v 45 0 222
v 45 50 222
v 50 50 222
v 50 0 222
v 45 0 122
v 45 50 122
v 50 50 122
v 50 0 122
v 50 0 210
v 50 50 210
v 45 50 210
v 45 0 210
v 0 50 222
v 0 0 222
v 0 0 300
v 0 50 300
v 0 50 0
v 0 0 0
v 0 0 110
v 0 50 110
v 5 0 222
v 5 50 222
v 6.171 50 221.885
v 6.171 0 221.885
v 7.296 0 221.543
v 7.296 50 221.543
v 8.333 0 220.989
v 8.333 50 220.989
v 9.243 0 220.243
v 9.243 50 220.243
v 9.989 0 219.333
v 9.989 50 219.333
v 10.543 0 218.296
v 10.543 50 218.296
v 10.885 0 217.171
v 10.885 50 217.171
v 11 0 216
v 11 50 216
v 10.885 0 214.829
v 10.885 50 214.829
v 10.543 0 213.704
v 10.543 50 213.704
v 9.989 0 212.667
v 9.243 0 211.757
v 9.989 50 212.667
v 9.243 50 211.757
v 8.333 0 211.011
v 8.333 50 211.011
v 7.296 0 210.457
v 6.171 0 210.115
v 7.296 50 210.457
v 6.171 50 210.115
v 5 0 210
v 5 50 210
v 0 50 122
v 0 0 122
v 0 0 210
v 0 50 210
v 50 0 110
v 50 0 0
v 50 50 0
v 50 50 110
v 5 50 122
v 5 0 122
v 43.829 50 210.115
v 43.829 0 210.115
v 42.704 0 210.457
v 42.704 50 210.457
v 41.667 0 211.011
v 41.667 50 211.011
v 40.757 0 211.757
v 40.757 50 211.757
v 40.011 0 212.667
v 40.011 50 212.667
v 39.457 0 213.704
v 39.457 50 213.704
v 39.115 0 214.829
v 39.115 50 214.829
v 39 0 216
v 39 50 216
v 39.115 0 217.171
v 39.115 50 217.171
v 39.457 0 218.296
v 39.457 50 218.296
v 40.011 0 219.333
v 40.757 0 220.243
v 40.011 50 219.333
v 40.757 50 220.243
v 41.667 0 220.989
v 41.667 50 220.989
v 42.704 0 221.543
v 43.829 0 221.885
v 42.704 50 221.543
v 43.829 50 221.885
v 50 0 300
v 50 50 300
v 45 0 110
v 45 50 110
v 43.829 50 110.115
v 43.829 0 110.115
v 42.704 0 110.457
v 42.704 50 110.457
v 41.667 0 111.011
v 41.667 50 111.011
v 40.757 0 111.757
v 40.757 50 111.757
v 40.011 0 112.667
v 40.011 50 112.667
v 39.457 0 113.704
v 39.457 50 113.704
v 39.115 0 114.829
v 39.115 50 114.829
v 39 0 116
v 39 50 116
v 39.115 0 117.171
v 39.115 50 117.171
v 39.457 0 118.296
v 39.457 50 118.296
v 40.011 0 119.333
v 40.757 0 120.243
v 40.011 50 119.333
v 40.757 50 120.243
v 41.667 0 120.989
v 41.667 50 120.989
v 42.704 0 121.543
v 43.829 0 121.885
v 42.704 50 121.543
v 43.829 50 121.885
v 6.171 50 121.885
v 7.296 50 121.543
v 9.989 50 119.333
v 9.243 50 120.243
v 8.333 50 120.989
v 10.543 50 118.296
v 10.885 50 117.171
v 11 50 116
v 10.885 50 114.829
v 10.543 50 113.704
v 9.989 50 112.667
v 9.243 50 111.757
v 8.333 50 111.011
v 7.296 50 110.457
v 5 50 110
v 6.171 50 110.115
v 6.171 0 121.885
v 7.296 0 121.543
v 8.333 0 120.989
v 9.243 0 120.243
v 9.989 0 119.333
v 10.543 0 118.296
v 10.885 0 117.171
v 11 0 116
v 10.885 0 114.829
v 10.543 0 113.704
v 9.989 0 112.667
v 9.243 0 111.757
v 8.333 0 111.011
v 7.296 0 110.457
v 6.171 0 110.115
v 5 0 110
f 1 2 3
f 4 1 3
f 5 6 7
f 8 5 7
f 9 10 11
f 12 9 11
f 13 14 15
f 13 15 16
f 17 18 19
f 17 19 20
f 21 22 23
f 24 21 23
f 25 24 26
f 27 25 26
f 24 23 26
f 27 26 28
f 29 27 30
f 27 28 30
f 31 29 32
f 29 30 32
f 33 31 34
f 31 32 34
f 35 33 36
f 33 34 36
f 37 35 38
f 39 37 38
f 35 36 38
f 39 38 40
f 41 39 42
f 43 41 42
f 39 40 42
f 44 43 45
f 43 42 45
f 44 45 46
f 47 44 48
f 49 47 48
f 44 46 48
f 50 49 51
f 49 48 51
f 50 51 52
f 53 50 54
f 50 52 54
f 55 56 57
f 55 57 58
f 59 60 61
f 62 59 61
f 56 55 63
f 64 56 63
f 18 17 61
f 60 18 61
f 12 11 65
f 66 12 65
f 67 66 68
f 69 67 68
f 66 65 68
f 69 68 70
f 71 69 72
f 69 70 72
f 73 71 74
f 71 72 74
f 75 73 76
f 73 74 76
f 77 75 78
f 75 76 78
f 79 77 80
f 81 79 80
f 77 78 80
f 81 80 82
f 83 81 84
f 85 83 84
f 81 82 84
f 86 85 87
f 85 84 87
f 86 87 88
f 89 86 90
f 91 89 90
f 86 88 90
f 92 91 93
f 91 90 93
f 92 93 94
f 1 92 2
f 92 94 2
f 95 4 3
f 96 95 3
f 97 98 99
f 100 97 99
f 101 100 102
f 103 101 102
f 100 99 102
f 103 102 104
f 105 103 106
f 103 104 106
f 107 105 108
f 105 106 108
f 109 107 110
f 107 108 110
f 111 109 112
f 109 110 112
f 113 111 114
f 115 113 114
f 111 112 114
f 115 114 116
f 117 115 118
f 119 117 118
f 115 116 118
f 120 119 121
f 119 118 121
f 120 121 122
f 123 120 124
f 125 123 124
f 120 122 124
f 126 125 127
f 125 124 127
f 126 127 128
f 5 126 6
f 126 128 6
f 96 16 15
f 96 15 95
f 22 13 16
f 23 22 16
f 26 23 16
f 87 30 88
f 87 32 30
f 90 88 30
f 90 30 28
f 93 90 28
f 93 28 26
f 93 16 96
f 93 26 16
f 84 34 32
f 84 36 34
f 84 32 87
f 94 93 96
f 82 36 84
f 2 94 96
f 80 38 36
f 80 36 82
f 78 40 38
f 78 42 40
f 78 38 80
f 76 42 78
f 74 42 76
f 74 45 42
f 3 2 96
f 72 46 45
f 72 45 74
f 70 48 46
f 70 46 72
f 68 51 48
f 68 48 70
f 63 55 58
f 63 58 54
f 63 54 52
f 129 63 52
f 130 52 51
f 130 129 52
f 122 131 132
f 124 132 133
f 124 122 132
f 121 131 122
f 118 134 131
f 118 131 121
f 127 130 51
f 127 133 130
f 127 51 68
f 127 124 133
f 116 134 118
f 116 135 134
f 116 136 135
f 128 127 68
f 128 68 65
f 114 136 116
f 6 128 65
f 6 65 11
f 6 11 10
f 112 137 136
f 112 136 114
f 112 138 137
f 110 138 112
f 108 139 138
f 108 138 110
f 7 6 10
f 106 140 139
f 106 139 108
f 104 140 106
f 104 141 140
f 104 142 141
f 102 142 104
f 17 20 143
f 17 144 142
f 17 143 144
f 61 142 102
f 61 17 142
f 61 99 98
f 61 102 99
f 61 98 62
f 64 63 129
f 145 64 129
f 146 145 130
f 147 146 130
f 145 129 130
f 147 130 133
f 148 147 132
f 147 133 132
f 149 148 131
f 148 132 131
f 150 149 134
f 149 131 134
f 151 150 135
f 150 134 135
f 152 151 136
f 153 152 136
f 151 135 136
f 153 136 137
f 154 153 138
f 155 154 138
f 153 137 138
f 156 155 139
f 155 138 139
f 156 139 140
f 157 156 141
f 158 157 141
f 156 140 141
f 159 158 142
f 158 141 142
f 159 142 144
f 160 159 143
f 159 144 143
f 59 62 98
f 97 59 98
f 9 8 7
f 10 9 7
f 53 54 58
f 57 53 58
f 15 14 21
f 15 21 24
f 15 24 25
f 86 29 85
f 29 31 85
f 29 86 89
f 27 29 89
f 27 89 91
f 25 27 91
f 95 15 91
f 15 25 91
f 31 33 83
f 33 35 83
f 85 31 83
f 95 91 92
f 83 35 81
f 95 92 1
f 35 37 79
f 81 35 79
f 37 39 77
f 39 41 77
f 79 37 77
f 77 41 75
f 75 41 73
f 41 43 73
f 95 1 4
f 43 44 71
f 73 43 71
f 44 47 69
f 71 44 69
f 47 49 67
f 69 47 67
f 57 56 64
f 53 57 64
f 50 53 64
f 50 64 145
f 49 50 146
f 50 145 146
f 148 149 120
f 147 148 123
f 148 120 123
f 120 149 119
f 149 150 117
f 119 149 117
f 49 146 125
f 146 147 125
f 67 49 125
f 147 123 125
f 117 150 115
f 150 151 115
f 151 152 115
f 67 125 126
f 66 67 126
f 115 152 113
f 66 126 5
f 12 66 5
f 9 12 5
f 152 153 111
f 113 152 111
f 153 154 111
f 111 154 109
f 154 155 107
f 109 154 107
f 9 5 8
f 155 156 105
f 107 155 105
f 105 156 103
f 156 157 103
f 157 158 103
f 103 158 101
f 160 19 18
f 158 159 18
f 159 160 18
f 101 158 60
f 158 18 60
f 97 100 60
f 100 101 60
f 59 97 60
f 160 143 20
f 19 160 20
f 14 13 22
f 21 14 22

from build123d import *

# Parameters (mm, degrees)
F0_W     = 50
F0_H     = 50
F1_DEPTH = 300
F3_DEPTH = 50.001


with BuildPart() as f1:
    # F0 (on Top) → F1 (new body)
    with BuildSketch(Plane.XY):
        with Locations((25, 25)):
            Rectangle(F0_W, F0_H)
    extrude(amount=F1_DEPTH)

    # F2 (on face) → F3 (cut, through all)
    with BuildSketch(Plane(origin=(0, 50, 0), x_dir=(-1, 0, 0), z_dir=(0, 1, 0))):
        with BuildLine():
            Line((-50, 210), (-45, 210))
            ThreePointArc((-45, 210), (-39, 216), (-45, 222))
            Line((-45, 222), (-50, 222))
            Line((-50, 222), (-50, 210))
        make_face()
        with BuildLine():
            Line((0, 222), (-5, 222))
            ThreePointArc((-5, 222), (-11, 216), (-5, 210))
            Line((-5, 210), (0, 210))
            Line((0, 210), (0, 222))
        make_face()
        with BuildLine():
            Line((-50, 110), (-45, 110))
            ThreePointArc((-45, 110), (-39, 116), (-45, 122))
            Line((-45, 122), (-50, 122))
            Line((-50, 122), (-50, 110))
        make_face()
        with BuildLine():
            Line((0, 122), (-5, 122))
            ThreePointArc((-5, 122), (-11, 116), (-5, 110))
            Line((-5, 110), (0, 110))
            Line((0, 110), (0, 122))
        make_face()
    extrude(amount=-F3_DEPTH, mode=Mode.SUBTRACT)


solid = f1.part
